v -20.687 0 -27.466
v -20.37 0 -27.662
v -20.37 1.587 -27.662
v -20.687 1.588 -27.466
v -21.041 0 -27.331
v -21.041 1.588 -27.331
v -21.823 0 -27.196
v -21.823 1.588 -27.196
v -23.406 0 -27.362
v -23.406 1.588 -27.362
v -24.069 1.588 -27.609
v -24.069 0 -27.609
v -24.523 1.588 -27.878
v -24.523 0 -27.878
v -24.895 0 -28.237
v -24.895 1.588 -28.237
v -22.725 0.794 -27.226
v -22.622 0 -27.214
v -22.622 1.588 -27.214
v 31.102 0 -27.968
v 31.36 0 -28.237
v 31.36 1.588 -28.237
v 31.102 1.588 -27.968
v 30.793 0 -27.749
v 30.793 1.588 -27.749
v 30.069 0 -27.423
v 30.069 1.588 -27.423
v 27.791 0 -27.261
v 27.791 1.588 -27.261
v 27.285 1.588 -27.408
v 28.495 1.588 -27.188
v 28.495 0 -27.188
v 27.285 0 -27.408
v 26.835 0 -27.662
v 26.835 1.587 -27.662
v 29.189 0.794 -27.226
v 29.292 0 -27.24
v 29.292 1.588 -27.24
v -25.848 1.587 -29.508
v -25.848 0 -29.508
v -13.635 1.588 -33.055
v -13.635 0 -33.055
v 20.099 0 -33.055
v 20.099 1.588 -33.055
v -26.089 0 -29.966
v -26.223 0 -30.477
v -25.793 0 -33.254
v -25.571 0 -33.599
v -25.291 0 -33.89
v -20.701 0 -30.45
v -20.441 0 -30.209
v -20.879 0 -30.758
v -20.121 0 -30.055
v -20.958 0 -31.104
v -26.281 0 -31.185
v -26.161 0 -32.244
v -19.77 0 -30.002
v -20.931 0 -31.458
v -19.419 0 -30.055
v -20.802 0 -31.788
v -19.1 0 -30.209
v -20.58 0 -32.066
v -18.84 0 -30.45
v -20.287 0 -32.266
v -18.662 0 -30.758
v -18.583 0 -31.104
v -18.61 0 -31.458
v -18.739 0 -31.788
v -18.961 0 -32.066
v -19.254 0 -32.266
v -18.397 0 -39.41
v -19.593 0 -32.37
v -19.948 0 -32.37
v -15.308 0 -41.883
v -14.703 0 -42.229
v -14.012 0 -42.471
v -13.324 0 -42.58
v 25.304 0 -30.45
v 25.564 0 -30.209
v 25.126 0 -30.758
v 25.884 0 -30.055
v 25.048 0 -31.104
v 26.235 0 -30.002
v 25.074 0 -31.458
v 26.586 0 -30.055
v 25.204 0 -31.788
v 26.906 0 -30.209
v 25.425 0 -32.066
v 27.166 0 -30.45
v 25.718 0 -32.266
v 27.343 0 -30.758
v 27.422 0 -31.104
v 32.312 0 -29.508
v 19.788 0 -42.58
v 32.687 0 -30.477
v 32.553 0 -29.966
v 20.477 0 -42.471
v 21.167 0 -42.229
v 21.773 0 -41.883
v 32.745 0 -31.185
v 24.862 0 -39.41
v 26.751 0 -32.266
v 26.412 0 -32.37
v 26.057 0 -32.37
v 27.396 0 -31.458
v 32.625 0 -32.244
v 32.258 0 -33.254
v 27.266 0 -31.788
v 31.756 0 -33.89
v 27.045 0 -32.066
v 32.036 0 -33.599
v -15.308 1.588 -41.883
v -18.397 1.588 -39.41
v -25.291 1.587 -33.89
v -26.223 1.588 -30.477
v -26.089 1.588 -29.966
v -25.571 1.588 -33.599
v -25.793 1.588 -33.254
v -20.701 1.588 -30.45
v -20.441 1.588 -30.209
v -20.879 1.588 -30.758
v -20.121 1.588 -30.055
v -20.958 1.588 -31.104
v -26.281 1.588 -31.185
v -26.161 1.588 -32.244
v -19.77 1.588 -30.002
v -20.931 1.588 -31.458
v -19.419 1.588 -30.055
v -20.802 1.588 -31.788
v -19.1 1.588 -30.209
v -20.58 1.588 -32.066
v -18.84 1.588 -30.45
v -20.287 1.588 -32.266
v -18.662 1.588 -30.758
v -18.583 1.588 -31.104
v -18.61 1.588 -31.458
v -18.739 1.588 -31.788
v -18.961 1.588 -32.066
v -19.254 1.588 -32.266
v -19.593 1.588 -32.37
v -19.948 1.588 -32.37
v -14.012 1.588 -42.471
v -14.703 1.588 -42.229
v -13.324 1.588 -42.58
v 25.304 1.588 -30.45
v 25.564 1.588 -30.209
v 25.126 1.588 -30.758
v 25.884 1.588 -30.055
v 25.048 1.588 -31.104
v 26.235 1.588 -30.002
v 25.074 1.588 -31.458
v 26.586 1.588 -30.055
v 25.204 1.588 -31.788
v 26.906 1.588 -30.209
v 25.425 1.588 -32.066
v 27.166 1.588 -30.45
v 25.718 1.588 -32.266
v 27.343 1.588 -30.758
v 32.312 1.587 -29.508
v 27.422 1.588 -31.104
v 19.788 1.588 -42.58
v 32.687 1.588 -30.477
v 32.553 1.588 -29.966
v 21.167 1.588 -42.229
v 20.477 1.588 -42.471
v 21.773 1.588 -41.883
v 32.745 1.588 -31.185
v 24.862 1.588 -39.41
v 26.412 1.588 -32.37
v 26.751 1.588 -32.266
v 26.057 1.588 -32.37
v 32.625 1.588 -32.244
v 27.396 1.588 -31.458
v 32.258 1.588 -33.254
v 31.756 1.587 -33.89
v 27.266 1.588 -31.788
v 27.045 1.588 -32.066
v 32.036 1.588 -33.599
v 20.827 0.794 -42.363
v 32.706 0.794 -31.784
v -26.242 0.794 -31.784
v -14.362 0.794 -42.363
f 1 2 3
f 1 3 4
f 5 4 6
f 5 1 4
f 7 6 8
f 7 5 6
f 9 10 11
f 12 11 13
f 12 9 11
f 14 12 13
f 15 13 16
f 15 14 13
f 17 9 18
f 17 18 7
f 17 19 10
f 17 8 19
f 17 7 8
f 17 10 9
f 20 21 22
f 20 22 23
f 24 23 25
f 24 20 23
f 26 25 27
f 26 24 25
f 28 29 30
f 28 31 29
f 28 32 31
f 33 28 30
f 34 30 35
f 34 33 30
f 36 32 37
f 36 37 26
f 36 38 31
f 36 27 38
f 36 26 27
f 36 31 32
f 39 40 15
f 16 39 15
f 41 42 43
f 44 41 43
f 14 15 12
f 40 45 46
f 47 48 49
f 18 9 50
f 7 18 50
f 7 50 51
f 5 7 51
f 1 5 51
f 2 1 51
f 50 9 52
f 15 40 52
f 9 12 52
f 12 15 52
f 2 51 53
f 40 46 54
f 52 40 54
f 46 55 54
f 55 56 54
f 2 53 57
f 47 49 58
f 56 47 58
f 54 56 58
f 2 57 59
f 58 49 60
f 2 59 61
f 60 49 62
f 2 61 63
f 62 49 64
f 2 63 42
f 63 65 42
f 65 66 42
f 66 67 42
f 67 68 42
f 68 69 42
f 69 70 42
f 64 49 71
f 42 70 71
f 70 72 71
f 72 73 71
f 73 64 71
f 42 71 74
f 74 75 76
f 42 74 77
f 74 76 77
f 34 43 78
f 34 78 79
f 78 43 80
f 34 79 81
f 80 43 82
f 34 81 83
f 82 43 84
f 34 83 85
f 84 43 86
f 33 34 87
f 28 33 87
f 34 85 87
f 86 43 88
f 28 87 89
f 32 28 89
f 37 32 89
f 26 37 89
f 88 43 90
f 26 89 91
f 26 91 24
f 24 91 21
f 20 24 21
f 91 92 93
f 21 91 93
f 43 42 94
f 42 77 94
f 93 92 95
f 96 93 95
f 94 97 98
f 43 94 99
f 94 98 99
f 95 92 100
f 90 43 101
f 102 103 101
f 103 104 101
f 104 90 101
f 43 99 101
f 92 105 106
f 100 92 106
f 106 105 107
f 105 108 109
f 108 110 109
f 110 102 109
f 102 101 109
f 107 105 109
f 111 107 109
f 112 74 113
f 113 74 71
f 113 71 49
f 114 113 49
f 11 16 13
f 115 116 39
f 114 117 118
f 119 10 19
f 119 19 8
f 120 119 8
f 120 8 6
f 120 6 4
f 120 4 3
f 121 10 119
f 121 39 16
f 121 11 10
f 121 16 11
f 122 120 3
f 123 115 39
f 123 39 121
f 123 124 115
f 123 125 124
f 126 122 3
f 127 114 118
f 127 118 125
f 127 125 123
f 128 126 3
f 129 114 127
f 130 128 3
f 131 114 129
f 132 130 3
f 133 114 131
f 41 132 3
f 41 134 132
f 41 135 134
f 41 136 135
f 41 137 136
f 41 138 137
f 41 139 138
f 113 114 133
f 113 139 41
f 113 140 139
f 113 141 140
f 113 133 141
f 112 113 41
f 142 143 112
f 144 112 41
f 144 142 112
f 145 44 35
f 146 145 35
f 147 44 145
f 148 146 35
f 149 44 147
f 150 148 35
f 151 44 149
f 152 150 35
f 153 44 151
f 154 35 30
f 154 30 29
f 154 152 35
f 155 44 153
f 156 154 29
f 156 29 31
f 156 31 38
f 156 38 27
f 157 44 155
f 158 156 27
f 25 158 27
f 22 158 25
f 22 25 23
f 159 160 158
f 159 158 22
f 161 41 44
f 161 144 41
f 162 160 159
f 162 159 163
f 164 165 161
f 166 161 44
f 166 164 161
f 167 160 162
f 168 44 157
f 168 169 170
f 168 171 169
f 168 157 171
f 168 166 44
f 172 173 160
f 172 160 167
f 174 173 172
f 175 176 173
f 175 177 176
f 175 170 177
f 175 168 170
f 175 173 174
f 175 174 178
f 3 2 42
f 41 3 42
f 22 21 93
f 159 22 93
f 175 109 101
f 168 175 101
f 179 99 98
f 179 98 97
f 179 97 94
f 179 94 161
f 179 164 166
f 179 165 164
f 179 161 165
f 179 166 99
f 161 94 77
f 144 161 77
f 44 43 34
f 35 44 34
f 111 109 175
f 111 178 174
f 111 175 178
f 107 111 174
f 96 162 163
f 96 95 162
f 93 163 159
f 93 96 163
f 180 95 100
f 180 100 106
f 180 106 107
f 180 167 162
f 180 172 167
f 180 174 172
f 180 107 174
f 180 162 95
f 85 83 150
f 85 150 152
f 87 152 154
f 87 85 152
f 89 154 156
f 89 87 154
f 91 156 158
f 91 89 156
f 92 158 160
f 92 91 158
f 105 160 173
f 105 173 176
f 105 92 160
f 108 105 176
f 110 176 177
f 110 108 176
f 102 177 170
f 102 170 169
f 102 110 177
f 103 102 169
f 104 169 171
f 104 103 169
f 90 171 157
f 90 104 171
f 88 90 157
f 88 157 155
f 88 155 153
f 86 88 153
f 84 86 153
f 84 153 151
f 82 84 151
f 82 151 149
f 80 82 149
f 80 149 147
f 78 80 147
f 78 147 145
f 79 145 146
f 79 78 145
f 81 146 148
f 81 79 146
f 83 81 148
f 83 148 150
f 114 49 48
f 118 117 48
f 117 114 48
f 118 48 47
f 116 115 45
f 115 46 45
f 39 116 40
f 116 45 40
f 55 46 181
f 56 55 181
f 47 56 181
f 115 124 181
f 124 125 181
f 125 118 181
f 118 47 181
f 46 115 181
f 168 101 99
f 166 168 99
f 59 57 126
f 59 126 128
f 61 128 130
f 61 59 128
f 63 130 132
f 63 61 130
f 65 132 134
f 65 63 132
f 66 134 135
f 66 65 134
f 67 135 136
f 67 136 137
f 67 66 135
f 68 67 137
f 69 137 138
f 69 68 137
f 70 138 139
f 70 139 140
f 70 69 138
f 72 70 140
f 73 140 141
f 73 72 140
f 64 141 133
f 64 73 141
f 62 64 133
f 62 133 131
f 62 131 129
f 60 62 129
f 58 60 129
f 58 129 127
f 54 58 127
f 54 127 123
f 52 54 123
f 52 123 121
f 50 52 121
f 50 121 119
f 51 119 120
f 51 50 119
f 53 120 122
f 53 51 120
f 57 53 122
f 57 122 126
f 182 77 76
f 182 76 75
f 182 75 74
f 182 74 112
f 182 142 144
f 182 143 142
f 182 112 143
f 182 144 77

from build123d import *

# Parameters (mm, degrees)
SKETCH3_R           = 1.190625
BOSS_EXTRUDE1_DEPTH = 1.5875


with BuildPart() as part:
    # Sketch3 → Boss-Extrude1 (new body)
    with BuildSketch(Plane(origin=(0, 0, 0), x_dir=(1, 0, 0), z_dir=(0, 1, 0))):
        Polygon((-22.929311402, 25.613223092), (-13.634997975, 33.054629342), (20.099377025, 33.054629342), (29.393690453, 25.613223092), (34.156190453, 31.968309197), (24.861877025, 39.409715447), (20.902655838, 42.579629342), (-14.438276788, 42.579629342), (-18.397497975, 39.409715447), (-27.691811402, 31.968309197), align=None)
        with Locations(Location((-19.770435938, 31.192788903, 0), (0, 0, 270))):
            Circle(SKETCH3_R, mode=Mode.SUBTRACT)
        with Locations(Location((26.234814989, 31.192788903, 0), (0, 0, 270))):
            Circle(SKETCH3_R, mode=Mode.SUBTRACT)
    extrude(amount=BOSS_EXTRUDE1_DEPTH)

    # Fillet1
    # a fillet whose section is not a circle: 3.175 mm, written as the material it takes off along each edge
    with BuildSketch(Plane(origin=(-22.929311402, -8.195772914, -25.613223092), x_dir=(0.7806247497998012, 0, -0.6249999999999982), z_dir=(0, 1, 0)), Plane(origin=(29.393690453, -8.195772914, -25.613223092), x_dir=(0.5996925441644039, 0, -0.8002304995897274), z_dir=(0, 1, 0))) as fillet1_piece_1:
        with BuildLine():
            Bezier((3.278309166, 0), (0, 0), (0.104936119, 3.276629273), weights=[1, 0.448951306, 1])
            Line((0.104936119, 3.276629273), (0, 0))
            Line((0, 0), (3.278309166, 0))
        make_face()
    extrude(amount=17.979045828, mode=Mode.SUBTRACT)
    with BuildSketch(Plane(origin=(-27.691811402, -7.687366025, -31.968309197), x_dir=(0.7806247497998011, 0, -0.6249999999999983), z_dir=(0, 1, 0))) as fillet1_piece_2:
        with BuildLine():
            Bezier((3.07494641, 0), (0, 0), (-0.098426636, -3.073370727), weights=[1, 0.463559427, 1])
            Line((-0.098426636, -3.073370727), (0, 0))
            Line((0, 0), (3.07494641, 0))
        make_face()
    extrude(amount=16.962232051, mode=Mode.SUBTRACT)
    with BuildSketch(Plane(origin=(34.156190453, -7.687366025, -31.968309197), x_dir=(-0.7806247497995835, 0, -0.62500000000027), z_dir=(0, 1, 0))) as fillet1_piece_3:
        with BuildLine():
            Bezier((3.07494641, 0), (0, 0), (-0.098426636, 3.073370727), weights=[1, 0.463559427, 1])
            Line((-0.098426636, 3.073370727), (0, 0))
            Line((0, 0), (3.07494641, 0))
        make_face()
    extrude(amount=16.962232051, mode=Mode.SUBTRACT)
    with BuildSketch(Plane(origin=(20.902655838, -2.786065678, -42.579629342), x_dir=(-1, 0, 0), z_dir=(0, 1, 0)), Plane(origin=(-14.438276788, -2.786065678, -42.579629342), x_dir=(-0.780624749799802, 0, 0.6249999999999972), z_dir=(0, 1, 0))) as fillet1_piece_4:
        with BuildLine():
            Bezier((1.114426271, 0), (0, 0), (-0.869948729, 0.696516419), weights=[1, 0.608905409, 1])
            Line((-0.869948729, 0.696516419), (0, 0))
            Line((0, 0), (1.114426271, 0))
        make_face()
    extrude(amount=7.159631355, mode=Mode.SUBTRACT)


solid = part.part
